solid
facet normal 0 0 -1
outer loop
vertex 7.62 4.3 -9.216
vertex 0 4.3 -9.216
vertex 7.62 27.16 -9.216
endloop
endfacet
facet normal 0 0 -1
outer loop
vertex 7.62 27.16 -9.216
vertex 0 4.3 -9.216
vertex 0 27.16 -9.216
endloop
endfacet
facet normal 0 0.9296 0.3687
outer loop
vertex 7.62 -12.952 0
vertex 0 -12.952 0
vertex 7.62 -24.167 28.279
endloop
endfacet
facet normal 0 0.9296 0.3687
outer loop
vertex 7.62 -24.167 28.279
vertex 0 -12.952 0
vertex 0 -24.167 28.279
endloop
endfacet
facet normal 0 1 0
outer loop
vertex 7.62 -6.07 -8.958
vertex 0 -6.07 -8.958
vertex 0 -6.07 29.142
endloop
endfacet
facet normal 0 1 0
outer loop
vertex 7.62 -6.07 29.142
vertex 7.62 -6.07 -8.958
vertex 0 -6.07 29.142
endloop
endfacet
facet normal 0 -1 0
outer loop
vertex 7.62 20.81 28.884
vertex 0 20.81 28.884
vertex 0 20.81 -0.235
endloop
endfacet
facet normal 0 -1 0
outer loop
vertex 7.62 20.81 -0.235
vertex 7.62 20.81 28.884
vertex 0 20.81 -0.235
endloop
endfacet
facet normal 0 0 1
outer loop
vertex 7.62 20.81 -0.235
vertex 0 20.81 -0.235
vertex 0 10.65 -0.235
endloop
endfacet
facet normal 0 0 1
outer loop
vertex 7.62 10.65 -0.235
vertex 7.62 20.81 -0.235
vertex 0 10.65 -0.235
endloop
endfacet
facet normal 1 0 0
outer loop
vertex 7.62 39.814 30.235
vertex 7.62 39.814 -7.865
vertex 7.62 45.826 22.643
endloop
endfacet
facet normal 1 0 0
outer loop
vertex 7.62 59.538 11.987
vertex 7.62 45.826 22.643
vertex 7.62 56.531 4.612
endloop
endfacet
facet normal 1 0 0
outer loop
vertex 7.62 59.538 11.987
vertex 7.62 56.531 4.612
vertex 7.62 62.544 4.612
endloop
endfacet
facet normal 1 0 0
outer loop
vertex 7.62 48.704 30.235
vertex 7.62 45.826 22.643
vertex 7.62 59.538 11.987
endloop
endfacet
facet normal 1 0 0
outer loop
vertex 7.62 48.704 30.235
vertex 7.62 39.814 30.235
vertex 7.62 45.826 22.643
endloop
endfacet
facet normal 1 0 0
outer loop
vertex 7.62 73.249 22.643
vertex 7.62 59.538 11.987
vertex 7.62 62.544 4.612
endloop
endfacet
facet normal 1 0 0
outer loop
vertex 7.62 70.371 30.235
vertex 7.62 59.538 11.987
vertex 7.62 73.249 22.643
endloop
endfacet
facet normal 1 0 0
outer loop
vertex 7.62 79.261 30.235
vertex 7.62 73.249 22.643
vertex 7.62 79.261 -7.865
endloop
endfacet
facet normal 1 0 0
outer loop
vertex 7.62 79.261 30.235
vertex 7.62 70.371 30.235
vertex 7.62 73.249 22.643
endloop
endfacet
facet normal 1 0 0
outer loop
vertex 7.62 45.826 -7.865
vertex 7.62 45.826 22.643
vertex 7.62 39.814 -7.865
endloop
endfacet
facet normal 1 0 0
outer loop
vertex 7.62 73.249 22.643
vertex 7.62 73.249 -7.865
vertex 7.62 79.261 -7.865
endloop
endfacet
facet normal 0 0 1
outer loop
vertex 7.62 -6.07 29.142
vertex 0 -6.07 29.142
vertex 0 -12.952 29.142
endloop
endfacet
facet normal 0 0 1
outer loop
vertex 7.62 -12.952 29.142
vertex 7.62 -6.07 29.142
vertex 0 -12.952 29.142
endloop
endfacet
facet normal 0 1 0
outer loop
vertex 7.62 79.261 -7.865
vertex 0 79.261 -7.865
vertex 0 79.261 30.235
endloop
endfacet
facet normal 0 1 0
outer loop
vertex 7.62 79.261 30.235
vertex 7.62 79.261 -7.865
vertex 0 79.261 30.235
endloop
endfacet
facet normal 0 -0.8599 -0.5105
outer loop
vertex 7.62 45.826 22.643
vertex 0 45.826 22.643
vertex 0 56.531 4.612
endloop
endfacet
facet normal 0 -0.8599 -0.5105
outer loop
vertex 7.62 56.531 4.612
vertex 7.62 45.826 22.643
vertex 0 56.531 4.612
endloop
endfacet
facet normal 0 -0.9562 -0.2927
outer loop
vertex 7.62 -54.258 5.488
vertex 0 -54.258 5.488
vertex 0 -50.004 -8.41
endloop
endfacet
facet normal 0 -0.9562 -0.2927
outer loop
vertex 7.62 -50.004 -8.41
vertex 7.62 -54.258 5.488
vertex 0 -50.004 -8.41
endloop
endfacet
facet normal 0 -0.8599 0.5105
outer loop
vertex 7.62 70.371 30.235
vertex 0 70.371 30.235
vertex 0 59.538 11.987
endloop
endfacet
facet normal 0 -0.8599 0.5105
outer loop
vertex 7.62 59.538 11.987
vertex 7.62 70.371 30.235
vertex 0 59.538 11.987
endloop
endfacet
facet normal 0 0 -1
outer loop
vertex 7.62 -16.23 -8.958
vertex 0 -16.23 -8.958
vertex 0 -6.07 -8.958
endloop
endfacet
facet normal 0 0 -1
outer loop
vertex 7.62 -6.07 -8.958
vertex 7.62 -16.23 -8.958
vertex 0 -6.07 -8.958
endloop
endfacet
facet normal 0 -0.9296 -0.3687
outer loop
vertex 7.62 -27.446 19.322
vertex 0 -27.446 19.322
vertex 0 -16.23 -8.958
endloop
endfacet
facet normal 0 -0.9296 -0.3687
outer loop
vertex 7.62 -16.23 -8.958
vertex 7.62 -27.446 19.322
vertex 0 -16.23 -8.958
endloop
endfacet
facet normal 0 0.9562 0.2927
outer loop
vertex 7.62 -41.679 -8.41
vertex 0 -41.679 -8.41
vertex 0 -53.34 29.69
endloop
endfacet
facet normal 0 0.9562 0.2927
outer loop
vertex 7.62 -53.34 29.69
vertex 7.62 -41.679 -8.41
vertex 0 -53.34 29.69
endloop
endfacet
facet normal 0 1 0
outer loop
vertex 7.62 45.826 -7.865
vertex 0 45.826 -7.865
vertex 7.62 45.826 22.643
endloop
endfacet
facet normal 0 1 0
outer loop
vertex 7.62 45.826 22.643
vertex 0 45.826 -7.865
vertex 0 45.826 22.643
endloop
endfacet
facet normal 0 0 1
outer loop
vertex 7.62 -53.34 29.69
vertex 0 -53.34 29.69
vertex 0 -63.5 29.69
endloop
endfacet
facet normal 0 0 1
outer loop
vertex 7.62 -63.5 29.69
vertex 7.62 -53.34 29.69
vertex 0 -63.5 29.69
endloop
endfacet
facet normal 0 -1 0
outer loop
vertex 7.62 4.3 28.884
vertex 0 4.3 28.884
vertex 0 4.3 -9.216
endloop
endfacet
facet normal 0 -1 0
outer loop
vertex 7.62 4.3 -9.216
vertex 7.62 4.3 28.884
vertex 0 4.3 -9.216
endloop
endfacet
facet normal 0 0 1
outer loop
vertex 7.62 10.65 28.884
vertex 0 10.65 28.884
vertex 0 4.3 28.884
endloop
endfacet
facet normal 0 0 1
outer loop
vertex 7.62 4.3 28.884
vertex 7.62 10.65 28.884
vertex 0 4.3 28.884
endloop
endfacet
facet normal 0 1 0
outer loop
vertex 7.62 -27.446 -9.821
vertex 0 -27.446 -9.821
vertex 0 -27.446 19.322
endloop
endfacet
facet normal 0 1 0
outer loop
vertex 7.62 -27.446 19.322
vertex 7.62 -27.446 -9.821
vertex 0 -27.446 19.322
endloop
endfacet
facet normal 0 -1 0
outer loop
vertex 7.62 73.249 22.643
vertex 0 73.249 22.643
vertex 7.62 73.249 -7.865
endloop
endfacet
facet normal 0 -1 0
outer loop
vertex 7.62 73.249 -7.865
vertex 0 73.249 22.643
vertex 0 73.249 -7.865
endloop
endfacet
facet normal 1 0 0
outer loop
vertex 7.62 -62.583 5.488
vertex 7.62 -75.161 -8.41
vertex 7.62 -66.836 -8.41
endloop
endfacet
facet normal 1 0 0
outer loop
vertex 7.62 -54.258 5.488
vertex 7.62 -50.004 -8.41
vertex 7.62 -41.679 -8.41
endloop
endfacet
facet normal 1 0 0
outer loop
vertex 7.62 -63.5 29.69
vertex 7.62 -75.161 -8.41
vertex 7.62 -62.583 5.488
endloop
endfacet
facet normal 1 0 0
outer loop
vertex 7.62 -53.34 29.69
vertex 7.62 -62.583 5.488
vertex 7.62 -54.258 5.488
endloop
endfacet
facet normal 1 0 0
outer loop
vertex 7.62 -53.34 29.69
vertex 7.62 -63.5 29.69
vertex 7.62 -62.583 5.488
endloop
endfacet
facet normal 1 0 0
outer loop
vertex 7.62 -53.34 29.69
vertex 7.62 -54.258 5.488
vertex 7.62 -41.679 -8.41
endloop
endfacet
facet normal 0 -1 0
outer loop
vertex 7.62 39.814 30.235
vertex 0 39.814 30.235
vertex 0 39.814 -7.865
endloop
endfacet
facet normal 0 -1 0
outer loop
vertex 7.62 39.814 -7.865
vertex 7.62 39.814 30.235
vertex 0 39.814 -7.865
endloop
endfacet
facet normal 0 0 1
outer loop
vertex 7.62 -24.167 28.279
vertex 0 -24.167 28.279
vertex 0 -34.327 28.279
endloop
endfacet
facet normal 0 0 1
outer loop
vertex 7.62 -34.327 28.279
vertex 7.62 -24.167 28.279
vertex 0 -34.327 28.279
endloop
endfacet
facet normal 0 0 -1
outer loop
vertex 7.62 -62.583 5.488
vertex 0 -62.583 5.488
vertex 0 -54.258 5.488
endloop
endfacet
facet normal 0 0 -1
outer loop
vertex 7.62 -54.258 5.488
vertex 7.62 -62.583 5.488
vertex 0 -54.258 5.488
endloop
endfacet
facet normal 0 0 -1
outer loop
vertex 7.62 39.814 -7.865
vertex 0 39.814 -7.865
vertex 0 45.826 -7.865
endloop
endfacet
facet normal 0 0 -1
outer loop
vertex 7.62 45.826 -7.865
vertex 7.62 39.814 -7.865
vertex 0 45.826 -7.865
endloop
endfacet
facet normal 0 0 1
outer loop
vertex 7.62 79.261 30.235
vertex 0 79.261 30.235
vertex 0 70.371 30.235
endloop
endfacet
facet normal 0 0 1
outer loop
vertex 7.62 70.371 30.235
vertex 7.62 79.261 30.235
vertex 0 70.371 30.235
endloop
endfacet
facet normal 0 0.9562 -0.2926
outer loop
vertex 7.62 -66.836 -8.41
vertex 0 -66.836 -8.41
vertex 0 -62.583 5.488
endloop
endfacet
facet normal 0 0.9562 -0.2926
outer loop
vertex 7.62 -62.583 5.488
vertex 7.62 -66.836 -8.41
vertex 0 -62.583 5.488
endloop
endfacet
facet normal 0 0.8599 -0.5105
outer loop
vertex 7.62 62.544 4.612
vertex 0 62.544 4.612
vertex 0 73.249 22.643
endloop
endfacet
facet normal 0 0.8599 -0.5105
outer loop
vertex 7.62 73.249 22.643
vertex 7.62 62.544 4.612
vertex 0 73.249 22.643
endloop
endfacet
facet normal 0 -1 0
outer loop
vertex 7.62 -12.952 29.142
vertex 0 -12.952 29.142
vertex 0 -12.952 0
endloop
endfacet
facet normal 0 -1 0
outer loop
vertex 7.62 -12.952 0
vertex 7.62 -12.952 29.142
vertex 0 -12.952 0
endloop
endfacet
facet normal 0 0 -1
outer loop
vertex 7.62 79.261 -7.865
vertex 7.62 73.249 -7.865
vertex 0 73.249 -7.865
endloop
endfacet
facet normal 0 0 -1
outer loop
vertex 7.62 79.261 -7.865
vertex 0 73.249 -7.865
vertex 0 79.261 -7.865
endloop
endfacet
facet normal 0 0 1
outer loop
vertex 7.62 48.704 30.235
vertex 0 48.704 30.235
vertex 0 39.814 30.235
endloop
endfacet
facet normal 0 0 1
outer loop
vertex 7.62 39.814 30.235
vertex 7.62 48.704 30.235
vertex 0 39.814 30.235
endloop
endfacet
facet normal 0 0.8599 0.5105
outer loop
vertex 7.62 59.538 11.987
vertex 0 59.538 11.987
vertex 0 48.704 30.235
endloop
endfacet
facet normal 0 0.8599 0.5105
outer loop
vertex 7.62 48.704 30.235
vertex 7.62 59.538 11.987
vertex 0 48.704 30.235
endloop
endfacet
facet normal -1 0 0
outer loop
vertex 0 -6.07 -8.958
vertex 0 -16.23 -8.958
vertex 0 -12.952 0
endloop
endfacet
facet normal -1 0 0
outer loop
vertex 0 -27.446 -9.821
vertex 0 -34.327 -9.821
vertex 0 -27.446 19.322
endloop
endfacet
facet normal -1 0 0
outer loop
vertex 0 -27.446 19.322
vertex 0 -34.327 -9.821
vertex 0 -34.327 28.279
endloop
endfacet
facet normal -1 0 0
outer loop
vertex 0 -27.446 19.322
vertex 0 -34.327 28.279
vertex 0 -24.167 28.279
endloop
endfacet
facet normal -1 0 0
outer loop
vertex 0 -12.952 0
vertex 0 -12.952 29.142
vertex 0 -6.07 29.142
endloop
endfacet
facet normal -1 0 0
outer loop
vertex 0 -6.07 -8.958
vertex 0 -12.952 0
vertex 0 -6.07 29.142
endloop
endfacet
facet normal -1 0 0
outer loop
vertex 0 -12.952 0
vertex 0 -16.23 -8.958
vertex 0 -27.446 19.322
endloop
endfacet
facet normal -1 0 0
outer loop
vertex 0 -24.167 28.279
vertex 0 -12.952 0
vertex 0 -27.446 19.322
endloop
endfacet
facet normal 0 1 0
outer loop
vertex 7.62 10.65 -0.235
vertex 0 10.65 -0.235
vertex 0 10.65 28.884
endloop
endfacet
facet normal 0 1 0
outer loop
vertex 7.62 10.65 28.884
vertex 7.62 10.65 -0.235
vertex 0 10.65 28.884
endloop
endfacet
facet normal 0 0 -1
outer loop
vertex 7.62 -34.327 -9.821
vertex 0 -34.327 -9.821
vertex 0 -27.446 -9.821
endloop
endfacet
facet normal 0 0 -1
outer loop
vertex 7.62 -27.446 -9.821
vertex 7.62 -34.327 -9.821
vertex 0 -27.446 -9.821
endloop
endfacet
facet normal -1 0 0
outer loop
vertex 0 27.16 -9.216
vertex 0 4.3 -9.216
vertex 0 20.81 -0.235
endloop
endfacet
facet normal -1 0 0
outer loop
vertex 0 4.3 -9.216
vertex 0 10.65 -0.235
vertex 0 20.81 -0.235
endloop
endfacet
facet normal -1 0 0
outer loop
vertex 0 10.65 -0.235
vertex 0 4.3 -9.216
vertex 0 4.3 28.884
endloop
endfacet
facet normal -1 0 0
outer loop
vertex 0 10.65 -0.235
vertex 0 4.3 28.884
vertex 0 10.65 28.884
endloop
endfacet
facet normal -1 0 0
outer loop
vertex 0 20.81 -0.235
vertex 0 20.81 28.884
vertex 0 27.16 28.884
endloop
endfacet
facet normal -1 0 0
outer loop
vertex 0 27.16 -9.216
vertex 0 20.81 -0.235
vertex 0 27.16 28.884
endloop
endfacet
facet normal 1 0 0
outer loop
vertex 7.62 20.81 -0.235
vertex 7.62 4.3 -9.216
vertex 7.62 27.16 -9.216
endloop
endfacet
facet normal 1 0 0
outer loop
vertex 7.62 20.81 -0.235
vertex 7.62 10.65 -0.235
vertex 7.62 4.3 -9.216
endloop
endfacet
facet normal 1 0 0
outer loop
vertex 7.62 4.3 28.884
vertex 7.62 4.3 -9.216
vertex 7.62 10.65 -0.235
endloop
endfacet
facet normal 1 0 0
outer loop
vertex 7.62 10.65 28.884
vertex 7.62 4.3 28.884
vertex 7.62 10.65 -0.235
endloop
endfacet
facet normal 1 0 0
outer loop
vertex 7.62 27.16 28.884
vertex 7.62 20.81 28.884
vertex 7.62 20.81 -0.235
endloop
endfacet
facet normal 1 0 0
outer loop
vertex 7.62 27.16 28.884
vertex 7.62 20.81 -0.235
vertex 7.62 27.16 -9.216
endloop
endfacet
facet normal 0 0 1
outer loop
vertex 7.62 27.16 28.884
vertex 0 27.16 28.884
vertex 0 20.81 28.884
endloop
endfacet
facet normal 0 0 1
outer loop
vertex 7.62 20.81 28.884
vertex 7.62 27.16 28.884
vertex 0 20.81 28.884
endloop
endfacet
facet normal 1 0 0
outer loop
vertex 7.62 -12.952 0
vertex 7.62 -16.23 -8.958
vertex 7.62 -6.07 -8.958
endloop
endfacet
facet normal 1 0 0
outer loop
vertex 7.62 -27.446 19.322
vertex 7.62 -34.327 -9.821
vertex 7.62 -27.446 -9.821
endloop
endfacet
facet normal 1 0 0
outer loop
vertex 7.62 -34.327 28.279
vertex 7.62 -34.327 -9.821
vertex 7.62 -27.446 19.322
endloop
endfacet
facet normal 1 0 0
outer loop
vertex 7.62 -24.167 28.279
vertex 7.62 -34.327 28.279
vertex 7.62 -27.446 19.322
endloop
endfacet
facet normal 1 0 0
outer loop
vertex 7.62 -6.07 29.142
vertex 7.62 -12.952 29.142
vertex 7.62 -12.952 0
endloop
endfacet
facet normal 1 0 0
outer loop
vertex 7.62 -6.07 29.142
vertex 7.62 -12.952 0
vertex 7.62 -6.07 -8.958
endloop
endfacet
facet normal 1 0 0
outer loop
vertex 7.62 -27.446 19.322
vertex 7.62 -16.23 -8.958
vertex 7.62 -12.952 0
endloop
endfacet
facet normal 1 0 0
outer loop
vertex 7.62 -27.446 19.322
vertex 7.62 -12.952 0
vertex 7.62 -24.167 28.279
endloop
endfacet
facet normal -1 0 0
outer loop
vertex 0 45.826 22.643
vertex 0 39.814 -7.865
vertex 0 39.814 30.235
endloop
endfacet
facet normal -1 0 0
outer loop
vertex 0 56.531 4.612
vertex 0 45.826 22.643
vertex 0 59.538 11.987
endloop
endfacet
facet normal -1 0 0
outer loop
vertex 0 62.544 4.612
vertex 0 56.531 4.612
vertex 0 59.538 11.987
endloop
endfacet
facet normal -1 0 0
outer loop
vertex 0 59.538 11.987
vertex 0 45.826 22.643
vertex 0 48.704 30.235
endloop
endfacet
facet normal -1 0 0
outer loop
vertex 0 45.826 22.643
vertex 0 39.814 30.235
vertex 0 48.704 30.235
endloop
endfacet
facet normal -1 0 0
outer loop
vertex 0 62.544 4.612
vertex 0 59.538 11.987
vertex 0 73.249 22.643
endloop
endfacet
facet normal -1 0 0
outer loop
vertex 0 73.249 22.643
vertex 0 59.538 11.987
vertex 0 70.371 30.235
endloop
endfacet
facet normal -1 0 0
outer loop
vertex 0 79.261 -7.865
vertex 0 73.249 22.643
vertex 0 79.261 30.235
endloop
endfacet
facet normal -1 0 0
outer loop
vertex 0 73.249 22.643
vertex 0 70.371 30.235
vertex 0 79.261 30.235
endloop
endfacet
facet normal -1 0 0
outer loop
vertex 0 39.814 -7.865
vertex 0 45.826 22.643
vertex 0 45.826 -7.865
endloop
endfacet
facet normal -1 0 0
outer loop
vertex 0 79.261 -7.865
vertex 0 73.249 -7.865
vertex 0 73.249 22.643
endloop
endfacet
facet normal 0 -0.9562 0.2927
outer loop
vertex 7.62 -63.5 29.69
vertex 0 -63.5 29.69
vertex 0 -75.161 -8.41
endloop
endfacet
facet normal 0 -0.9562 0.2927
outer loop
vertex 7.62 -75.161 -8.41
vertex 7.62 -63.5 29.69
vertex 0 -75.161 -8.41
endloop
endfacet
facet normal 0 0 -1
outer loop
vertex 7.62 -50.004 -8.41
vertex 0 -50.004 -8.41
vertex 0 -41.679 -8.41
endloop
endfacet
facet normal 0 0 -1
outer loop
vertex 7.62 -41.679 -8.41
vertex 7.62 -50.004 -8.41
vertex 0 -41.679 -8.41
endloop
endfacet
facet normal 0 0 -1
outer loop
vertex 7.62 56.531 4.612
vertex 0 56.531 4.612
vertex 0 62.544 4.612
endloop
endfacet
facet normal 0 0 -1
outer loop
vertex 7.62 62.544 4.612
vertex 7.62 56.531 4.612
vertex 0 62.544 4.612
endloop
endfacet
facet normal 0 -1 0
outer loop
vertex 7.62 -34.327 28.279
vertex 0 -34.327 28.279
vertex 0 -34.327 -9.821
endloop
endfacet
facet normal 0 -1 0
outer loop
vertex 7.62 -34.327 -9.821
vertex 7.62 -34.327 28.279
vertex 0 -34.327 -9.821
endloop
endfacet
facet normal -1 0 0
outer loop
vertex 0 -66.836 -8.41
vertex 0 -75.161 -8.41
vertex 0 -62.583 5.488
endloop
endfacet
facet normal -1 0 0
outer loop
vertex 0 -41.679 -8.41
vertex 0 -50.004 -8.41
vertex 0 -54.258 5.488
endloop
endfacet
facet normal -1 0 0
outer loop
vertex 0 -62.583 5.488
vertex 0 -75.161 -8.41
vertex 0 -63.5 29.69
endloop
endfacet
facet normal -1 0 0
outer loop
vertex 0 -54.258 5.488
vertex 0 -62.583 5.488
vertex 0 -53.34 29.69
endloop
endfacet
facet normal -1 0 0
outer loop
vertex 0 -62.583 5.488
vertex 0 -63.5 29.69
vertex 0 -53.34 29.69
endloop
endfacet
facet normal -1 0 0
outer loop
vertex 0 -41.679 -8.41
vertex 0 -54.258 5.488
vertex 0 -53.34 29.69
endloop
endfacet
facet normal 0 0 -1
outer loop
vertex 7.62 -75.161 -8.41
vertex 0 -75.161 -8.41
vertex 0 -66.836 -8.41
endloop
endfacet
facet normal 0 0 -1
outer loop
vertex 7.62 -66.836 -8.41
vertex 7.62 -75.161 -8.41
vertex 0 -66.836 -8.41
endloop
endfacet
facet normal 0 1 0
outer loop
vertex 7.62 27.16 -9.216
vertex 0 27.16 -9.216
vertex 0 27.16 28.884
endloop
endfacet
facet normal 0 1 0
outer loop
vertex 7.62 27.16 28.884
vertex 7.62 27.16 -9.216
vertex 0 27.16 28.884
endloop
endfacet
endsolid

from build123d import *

# Parameters (mm, degrees)
F1_DEPTH = 7.62


with BuildPart() as f1:
    # F0 (on Right) → F1 (new body)
    with BuildSketch(Plane.YZ):
        Polygon((-63.500268, 29.690138), (-75.161205, -8.409862), (-66.836323, -8.409862), (-62.582709, 5.488051), (-54.257827, 5.488051), (-50.004213, -8.409862), (-41.679331, -8.409862), (-53.340268, 29.690138), align=None)
        Polygon((-34.327325, 28.279278), (-34.327325, -9.820722), (-27.445875, -9.820722), (-27.445875, 19.32153), (-16.230407, -8.957748), (-6.070407, -8.957748), (-6.070407, 29.142252), (-12.951858, 29.142252), (-12.951858, 0), (-24.167325, 28.279278), align=None)
        Polygon((10.649881, 28.884476), (4.299881, 28.884476), (4.299881, -9.215524), (27.159881, -9.215524), (27.159881, 28.884476), (20.809881, 28.884476), (20.809881, -0.234962), (10.649881, -0.234962), align=None)
        Polygon((39.814054, 30.23471), (39.814054, -7.86529), (45.826401, -7.86529), (45.826401, 22.643001), (56.53146, 4.611597), (62.543807, 4.611597), (73.248865, 22.643001), (73.248865, -7.86529), (79.261212, -7.86529), (79.261212, 30.23471), (70.371212, 30.23471), (59.537633, 11.986829), (48.704054, 30.23471), align=None)
    extrude(amount=F1_DEPTH)


solid = f1.part
